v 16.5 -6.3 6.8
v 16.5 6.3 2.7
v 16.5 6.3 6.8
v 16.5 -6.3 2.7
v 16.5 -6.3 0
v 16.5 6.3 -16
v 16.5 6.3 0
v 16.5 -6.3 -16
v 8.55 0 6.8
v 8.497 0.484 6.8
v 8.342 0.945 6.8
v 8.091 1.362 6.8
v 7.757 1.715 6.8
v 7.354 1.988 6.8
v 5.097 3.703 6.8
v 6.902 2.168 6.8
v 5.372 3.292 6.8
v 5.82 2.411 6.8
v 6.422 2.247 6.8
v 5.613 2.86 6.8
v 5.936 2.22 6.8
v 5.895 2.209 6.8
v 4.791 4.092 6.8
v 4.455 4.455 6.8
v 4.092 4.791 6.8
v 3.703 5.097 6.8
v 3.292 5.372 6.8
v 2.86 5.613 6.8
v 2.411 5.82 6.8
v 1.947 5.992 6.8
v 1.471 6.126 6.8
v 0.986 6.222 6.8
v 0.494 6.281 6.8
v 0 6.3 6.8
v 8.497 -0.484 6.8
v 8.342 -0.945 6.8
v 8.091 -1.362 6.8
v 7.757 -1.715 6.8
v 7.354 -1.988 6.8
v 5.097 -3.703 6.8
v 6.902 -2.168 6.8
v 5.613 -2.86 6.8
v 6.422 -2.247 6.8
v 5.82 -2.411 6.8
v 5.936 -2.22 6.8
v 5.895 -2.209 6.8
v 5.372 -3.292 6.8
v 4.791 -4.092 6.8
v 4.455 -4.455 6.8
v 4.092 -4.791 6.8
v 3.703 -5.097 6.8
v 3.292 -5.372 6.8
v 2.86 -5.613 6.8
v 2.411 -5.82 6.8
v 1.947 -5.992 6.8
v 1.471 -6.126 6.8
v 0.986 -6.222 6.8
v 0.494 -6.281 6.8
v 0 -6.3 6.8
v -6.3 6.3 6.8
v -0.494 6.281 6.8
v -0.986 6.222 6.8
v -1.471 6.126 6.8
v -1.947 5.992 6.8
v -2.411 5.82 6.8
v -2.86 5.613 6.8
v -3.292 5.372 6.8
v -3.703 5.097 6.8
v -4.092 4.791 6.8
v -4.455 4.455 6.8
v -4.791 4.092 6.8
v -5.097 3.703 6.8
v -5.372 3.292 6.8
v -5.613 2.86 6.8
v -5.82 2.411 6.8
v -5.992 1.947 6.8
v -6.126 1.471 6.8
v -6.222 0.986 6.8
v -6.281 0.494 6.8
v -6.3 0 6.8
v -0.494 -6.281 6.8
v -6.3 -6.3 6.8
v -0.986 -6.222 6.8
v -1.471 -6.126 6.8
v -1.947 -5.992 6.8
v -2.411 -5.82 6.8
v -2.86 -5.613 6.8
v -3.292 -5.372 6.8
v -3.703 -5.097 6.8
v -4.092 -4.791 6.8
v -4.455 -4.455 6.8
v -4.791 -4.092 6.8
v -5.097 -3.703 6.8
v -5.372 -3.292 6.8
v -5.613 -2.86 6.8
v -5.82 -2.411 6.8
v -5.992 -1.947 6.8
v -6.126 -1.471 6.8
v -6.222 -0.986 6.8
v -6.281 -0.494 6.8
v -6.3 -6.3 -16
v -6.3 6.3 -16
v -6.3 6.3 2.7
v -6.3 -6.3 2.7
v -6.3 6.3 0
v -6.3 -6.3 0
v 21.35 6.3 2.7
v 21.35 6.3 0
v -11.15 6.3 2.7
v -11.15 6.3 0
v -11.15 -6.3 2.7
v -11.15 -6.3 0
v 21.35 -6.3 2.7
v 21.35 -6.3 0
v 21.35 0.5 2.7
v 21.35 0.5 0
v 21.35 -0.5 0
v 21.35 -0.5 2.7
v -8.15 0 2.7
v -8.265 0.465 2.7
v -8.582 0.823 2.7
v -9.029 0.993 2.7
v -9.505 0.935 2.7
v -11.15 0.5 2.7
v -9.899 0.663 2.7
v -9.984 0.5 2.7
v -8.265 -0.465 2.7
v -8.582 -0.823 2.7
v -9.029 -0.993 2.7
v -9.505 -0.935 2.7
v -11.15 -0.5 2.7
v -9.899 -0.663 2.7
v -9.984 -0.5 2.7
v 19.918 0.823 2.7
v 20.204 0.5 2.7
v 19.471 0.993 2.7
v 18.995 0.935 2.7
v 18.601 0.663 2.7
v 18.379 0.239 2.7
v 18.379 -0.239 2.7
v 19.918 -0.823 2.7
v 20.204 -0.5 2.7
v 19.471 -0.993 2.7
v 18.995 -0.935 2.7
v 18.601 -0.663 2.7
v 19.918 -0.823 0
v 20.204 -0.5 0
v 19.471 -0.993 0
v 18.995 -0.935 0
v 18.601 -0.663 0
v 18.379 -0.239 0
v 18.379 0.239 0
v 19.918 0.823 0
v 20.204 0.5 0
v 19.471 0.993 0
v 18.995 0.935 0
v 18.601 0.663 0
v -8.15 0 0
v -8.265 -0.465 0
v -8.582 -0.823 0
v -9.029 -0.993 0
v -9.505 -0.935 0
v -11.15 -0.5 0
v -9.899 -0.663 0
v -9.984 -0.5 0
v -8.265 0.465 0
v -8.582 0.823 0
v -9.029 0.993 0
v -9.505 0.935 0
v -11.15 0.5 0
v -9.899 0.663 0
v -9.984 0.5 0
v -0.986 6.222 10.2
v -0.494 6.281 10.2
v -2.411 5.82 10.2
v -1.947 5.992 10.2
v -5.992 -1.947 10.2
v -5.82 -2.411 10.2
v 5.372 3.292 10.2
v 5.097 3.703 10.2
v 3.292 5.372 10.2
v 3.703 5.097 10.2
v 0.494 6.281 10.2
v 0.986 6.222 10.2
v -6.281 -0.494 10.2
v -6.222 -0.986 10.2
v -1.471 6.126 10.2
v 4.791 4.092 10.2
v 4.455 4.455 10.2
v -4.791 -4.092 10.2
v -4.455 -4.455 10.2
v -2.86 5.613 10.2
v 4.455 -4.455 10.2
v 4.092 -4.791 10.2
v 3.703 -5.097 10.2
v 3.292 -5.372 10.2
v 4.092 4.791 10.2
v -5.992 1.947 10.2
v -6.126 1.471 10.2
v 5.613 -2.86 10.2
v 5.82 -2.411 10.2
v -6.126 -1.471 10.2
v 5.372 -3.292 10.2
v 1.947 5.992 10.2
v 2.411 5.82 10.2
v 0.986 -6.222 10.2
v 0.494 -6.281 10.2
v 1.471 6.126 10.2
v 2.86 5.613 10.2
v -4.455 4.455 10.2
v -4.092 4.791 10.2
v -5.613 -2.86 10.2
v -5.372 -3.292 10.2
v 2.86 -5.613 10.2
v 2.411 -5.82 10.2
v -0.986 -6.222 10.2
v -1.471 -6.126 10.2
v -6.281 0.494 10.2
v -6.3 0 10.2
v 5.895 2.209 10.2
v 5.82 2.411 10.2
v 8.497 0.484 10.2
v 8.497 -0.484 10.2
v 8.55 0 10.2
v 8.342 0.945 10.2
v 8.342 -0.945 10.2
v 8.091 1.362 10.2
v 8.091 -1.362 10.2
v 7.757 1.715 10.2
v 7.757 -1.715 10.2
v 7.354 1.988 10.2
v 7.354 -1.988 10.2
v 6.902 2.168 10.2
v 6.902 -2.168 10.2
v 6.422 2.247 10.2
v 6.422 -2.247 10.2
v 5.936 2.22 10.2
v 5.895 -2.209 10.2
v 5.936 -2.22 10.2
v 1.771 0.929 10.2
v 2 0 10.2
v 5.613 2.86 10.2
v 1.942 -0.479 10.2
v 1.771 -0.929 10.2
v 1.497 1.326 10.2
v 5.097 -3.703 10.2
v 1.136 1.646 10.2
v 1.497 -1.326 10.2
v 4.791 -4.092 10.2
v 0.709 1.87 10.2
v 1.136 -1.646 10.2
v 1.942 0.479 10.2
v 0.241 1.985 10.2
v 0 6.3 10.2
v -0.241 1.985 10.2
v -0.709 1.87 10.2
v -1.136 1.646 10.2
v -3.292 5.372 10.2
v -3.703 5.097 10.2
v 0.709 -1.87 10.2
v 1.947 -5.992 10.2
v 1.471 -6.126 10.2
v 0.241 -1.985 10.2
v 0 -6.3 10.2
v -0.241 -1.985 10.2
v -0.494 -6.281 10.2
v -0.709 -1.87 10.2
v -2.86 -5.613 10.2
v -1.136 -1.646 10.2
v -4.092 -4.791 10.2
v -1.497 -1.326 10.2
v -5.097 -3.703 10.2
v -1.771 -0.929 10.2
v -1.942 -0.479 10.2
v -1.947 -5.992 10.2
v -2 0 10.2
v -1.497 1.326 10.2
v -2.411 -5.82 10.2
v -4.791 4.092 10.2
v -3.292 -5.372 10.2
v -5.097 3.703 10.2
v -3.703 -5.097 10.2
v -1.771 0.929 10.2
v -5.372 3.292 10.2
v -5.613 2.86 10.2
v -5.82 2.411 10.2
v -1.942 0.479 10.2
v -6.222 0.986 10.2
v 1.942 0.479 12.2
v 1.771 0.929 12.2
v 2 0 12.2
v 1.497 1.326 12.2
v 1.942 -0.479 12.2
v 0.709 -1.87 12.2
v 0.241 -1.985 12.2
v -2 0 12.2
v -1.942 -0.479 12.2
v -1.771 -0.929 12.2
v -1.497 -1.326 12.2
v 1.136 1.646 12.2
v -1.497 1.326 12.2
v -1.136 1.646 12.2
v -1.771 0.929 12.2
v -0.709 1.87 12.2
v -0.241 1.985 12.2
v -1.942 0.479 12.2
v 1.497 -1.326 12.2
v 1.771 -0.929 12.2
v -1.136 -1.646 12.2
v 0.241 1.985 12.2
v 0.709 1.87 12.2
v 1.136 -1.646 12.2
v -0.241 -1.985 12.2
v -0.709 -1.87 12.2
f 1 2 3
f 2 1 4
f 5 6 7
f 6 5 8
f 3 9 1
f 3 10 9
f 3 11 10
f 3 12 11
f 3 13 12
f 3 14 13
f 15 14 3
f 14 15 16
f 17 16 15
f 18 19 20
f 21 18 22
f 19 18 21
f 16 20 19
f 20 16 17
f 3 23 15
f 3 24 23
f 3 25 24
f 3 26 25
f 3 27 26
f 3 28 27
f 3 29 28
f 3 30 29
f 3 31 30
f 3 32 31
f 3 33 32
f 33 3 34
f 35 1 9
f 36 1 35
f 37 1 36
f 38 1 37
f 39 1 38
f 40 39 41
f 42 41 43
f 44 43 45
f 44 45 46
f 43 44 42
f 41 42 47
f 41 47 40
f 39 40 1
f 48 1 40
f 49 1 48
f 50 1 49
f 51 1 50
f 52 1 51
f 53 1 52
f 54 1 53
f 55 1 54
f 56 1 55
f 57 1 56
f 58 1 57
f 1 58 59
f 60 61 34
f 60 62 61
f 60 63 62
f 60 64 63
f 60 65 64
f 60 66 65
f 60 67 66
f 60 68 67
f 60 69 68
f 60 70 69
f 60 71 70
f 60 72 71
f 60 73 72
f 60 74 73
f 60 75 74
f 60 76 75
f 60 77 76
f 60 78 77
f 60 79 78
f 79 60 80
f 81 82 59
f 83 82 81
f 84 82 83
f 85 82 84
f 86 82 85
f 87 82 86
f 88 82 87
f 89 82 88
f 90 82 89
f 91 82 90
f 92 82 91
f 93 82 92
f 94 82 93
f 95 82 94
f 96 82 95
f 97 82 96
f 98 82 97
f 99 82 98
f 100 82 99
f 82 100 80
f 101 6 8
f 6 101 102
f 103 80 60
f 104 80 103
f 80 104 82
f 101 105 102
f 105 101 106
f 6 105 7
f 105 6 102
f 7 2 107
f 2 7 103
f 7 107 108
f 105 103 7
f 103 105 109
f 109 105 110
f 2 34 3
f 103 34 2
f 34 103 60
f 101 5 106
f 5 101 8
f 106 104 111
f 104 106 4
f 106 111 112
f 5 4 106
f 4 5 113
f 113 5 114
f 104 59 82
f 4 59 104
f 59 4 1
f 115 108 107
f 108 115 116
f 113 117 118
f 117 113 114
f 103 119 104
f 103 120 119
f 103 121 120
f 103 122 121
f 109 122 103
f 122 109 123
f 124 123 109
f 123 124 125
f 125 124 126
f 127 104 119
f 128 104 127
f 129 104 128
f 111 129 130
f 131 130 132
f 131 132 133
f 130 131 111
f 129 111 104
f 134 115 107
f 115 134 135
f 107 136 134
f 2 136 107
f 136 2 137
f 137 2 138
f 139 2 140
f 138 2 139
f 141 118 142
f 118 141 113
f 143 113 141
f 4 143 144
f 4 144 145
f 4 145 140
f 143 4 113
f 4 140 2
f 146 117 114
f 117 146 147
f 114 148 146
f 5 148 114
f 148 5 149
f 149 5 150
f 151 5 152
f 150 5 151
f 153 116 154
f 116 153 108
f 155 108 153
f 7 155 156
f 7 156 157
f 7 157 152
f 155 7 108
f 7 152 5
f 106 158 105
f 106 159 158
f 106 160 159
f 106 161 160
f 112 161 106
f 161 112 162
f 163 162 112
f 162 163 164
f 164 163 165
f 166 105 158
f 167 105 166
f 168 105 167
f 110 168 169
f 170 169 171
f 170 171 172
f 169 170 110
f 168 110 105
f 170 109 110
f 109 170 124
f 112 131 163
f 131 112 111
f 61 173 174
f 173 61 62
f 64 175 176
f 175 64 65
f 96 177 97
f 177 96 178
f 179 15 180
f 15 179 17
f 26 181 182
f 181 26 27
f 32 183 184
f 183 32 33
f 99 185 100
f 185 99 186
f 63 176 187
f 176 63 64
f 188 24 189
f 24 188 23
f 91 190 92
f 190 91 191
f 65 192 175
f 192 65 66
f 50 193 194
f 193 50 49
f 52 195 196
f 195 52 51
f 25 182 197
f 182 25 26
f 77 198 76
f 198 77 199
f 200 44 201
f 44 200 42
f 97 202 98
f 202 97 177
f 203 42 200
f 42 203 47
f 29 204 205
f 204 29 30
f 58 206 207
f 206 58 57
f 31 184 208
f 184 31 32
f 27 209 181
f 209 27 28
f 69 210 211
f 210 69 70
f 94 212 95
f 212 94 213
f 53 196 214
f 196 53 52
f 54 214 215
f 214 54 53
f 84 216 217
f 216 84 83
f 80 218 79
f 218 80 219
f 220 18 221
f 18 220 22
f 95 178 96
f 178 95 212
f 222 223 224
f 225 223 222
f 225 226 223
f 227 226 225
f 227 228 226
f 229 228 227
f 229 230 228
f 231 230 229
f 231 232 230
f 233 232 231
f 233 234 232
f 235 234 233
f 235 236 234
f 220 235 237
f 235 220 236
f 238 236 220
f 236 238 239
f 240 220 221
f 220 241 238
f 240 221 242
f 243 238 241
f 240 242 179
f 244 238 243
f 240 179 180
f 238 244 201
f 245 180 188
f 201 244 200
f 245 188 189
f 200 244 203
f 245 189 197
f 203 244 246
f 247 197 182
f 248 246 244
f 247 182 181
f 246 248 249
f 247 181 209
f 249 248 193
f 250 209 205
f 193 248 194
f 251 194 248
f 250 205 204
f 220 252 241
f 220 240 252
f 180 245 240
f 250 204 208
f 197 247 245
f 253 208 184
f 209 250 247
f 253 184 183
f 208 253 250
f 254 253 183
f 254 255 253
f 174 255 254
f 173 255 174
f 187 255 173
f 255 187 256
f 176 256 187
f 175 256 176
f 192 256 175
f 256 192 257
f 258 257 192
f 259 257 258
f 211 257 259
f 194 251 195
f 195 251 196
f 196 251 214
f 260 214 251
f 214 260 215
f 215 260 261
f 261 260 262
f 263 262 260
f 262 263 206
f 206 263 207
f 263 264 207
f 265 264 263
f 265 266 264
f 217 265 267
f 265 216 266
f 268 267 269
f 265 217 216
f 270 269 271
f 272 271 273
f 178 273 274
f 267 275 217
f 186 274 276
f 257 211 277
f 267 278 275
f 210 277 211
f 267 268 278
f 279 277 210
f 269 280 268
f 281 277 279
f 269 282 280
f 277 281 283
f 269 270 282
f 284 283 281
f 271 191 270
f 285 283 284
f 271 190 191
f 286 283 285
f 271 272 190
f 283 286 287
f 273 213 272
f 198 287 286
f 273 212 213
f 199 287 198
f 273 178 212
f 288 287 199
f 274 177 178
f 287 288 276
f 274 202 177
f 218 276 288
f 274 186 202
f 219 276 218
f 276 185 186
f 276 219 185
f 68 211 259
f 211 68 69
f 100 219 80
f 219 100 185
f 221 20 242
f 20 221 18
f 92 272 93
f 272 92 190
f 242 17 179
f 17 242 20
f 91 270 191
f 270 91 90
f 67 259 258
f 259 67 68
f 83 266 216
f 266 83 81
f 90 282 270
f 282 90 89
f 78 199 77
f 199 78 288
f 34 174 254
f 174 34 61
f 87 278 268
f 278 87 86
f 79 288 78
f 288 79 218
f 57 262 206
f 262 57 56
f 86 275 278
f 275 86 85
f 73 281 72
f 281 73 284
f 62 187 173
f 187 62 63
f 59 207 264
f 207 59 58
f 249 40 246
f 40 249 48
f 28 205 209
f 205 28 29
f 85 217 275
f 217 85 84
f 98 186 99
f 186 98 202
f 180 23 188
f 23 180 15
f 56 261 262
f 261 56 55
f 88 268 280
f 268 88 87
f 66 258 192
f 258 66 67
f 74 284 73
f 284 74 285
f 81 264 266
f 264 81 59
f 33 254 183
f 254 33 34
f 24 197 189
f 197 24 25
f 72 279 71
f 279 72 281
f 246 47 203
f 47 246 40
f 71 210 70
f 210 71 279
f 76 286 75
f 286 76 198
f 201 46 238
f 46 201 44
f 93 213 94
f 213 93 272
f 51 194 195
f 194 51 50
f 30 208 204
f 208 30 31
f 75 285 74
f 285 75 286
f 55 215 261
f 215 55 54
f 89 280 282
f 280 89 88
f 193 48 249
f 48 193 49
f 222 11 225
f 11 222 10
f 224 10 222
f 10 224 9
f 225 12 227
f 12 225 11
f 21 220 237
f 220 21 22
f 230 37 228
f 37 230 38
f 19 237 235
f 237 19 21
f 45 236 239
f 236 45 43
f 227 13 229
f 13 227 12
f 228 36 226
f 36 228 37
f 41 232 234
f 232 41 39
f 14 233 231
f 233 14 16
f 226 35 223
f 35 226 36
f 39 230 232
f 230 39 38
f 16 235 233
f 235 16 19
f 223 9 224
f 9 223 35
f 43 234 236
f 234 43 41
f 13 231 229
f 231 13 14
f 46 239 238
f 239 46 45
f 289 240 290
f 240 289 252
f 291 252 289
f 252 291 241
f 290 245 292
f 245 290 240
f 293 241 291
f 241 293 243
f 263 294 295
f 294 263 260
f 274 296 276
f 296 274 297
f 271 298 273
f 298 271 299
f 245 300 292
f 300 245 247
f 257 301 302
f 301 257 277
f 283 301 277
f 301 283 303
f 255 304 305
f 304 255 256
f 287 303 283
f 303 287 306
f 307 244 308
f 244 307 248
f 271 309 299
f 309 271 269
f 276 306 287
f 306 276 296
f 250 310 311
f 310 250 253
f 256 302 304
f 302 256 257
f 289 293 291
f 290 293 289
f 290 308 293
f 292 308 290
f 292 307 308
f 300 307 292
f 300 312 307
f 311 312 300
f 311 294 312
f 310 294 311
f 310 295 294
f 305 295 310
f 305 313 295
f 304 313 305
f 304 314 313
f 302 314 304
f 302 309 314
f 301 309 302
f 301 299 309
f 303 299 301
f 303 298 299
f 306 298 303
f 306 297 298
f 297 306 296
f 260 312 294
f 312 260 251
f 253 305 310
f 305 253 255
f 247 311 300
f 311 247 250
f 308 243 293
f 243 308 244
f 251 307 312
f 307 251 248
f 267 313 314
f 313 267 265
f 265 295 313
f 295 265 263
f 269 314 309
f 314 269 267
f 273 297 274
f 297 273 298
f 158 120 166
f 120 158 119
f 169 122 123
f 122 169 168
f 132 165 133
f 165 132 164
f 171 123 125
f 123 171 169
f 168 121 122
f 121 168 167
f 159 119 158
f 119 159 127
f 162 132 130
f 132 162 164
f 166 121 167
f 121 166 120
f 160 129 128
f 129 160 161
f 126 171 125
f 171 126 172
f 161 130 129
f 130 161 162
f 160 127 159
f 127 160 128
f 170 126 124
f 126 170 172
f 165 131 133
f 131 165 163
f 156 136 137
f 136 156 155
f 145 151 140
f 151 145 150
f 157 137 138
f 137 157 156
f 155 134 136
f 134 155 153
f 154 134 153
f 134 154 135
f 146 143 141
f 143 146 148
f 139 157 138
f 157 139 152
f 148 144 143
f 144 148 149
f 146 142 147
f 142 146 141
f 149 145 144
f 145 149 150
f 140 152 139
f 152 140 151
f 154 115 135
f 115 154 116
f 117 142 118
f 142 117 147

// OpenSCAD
// TowerPro SG90 servo mockup


$fs = 0.5;
$fa = 2.5;

//    L = 22.8;
//    l = 12.6;
//    h = 22.8;
//    plateL = 32.5;
//    plateH = 2.7;
//    plateHPos = 16;
//    topCylinderH = 3.4;
//    smallTopCylinderD = 4.5;
//    
//    axisH = 2;
//    axisD = 4;
//    
//    screwHoleCenter=2;
//    screwHoleD=2;
//    holeSize=1;

L = 22.8;
l = 12.6;
H = 22.8;
PLATE_L = 32.5;
PLATE_H = 2.7;
PLATE_H_POS = 16;
TOP_CYLINDER_H = 3.4;
SMALL_TOP_CYLINDER_D = 4.5;

AXIS_H = 2;
AXIS_D = 4;

SCREW_HOLE_CENTER = 2;
SCREW_HOLE_D = 2;
HOLE_SIZE = 1;

$fs = 0.5;
$fa = 2.5;


module SG90()
{
    translate([-l/2, -l/2, -PLATE_H_POS]) {
        difference() {
            union() {
                    
                // main part
                cube([L, l, H]);
                
                // support
                translate([-(PLATE_L-L) / 2, 0, PLATE_H_POS]) {
                    cube([PLATE_L, l, PLATE_H]);
                }
                
                // top big cylinder
                translate([l/2, l/2, H]) {
                    cylinder(d=l, h=TOP_CYLINDER_H);
                }
                
                // top small cylinder
                translate([l, l/2, H]) { 
                    cylinder(d=SMALL_TOP_CYLINDER_D, h=TOP_CYLINDER_H);
                }
                translate([l/2, l/2, H+TOP_CYLINDER_H]) {
                    cylinder(d=AXIS_D, h=AXIS_H);
                }
            }
            translate([-(PLATE_L-L)/2+SCREW_HOLE_CENTER, l/2, PLATE_H_POS]) {
                cylinder(d=SCREW_HOLE_D, h=10, center=true);
            }
            translate([-(PLATE_L-L)/2-1, l/2-HOLE_SIZE/2, PLATE_H_POS-1]) {
                cube([3,HOLE_SIZE,4]);
            }
            translate([PLATE_L-(PLATE_L-L)/2-SCREW_HOLE_CENTER, l/2, PLATE_H_POS-1]) {
                cylinder(d=SCREW_HOLE_D, h=10, center=true);
            }
            translate([PLATE_L-(PLATE_L-L)/2-SCREW_HOLE_CENTER, l/2-HOLE_SIZE/2, PLATE_H_POS-1]) {
                cube([3, HOLE_SIZE, 4]);
            }
        }
    }
}


SG90();
